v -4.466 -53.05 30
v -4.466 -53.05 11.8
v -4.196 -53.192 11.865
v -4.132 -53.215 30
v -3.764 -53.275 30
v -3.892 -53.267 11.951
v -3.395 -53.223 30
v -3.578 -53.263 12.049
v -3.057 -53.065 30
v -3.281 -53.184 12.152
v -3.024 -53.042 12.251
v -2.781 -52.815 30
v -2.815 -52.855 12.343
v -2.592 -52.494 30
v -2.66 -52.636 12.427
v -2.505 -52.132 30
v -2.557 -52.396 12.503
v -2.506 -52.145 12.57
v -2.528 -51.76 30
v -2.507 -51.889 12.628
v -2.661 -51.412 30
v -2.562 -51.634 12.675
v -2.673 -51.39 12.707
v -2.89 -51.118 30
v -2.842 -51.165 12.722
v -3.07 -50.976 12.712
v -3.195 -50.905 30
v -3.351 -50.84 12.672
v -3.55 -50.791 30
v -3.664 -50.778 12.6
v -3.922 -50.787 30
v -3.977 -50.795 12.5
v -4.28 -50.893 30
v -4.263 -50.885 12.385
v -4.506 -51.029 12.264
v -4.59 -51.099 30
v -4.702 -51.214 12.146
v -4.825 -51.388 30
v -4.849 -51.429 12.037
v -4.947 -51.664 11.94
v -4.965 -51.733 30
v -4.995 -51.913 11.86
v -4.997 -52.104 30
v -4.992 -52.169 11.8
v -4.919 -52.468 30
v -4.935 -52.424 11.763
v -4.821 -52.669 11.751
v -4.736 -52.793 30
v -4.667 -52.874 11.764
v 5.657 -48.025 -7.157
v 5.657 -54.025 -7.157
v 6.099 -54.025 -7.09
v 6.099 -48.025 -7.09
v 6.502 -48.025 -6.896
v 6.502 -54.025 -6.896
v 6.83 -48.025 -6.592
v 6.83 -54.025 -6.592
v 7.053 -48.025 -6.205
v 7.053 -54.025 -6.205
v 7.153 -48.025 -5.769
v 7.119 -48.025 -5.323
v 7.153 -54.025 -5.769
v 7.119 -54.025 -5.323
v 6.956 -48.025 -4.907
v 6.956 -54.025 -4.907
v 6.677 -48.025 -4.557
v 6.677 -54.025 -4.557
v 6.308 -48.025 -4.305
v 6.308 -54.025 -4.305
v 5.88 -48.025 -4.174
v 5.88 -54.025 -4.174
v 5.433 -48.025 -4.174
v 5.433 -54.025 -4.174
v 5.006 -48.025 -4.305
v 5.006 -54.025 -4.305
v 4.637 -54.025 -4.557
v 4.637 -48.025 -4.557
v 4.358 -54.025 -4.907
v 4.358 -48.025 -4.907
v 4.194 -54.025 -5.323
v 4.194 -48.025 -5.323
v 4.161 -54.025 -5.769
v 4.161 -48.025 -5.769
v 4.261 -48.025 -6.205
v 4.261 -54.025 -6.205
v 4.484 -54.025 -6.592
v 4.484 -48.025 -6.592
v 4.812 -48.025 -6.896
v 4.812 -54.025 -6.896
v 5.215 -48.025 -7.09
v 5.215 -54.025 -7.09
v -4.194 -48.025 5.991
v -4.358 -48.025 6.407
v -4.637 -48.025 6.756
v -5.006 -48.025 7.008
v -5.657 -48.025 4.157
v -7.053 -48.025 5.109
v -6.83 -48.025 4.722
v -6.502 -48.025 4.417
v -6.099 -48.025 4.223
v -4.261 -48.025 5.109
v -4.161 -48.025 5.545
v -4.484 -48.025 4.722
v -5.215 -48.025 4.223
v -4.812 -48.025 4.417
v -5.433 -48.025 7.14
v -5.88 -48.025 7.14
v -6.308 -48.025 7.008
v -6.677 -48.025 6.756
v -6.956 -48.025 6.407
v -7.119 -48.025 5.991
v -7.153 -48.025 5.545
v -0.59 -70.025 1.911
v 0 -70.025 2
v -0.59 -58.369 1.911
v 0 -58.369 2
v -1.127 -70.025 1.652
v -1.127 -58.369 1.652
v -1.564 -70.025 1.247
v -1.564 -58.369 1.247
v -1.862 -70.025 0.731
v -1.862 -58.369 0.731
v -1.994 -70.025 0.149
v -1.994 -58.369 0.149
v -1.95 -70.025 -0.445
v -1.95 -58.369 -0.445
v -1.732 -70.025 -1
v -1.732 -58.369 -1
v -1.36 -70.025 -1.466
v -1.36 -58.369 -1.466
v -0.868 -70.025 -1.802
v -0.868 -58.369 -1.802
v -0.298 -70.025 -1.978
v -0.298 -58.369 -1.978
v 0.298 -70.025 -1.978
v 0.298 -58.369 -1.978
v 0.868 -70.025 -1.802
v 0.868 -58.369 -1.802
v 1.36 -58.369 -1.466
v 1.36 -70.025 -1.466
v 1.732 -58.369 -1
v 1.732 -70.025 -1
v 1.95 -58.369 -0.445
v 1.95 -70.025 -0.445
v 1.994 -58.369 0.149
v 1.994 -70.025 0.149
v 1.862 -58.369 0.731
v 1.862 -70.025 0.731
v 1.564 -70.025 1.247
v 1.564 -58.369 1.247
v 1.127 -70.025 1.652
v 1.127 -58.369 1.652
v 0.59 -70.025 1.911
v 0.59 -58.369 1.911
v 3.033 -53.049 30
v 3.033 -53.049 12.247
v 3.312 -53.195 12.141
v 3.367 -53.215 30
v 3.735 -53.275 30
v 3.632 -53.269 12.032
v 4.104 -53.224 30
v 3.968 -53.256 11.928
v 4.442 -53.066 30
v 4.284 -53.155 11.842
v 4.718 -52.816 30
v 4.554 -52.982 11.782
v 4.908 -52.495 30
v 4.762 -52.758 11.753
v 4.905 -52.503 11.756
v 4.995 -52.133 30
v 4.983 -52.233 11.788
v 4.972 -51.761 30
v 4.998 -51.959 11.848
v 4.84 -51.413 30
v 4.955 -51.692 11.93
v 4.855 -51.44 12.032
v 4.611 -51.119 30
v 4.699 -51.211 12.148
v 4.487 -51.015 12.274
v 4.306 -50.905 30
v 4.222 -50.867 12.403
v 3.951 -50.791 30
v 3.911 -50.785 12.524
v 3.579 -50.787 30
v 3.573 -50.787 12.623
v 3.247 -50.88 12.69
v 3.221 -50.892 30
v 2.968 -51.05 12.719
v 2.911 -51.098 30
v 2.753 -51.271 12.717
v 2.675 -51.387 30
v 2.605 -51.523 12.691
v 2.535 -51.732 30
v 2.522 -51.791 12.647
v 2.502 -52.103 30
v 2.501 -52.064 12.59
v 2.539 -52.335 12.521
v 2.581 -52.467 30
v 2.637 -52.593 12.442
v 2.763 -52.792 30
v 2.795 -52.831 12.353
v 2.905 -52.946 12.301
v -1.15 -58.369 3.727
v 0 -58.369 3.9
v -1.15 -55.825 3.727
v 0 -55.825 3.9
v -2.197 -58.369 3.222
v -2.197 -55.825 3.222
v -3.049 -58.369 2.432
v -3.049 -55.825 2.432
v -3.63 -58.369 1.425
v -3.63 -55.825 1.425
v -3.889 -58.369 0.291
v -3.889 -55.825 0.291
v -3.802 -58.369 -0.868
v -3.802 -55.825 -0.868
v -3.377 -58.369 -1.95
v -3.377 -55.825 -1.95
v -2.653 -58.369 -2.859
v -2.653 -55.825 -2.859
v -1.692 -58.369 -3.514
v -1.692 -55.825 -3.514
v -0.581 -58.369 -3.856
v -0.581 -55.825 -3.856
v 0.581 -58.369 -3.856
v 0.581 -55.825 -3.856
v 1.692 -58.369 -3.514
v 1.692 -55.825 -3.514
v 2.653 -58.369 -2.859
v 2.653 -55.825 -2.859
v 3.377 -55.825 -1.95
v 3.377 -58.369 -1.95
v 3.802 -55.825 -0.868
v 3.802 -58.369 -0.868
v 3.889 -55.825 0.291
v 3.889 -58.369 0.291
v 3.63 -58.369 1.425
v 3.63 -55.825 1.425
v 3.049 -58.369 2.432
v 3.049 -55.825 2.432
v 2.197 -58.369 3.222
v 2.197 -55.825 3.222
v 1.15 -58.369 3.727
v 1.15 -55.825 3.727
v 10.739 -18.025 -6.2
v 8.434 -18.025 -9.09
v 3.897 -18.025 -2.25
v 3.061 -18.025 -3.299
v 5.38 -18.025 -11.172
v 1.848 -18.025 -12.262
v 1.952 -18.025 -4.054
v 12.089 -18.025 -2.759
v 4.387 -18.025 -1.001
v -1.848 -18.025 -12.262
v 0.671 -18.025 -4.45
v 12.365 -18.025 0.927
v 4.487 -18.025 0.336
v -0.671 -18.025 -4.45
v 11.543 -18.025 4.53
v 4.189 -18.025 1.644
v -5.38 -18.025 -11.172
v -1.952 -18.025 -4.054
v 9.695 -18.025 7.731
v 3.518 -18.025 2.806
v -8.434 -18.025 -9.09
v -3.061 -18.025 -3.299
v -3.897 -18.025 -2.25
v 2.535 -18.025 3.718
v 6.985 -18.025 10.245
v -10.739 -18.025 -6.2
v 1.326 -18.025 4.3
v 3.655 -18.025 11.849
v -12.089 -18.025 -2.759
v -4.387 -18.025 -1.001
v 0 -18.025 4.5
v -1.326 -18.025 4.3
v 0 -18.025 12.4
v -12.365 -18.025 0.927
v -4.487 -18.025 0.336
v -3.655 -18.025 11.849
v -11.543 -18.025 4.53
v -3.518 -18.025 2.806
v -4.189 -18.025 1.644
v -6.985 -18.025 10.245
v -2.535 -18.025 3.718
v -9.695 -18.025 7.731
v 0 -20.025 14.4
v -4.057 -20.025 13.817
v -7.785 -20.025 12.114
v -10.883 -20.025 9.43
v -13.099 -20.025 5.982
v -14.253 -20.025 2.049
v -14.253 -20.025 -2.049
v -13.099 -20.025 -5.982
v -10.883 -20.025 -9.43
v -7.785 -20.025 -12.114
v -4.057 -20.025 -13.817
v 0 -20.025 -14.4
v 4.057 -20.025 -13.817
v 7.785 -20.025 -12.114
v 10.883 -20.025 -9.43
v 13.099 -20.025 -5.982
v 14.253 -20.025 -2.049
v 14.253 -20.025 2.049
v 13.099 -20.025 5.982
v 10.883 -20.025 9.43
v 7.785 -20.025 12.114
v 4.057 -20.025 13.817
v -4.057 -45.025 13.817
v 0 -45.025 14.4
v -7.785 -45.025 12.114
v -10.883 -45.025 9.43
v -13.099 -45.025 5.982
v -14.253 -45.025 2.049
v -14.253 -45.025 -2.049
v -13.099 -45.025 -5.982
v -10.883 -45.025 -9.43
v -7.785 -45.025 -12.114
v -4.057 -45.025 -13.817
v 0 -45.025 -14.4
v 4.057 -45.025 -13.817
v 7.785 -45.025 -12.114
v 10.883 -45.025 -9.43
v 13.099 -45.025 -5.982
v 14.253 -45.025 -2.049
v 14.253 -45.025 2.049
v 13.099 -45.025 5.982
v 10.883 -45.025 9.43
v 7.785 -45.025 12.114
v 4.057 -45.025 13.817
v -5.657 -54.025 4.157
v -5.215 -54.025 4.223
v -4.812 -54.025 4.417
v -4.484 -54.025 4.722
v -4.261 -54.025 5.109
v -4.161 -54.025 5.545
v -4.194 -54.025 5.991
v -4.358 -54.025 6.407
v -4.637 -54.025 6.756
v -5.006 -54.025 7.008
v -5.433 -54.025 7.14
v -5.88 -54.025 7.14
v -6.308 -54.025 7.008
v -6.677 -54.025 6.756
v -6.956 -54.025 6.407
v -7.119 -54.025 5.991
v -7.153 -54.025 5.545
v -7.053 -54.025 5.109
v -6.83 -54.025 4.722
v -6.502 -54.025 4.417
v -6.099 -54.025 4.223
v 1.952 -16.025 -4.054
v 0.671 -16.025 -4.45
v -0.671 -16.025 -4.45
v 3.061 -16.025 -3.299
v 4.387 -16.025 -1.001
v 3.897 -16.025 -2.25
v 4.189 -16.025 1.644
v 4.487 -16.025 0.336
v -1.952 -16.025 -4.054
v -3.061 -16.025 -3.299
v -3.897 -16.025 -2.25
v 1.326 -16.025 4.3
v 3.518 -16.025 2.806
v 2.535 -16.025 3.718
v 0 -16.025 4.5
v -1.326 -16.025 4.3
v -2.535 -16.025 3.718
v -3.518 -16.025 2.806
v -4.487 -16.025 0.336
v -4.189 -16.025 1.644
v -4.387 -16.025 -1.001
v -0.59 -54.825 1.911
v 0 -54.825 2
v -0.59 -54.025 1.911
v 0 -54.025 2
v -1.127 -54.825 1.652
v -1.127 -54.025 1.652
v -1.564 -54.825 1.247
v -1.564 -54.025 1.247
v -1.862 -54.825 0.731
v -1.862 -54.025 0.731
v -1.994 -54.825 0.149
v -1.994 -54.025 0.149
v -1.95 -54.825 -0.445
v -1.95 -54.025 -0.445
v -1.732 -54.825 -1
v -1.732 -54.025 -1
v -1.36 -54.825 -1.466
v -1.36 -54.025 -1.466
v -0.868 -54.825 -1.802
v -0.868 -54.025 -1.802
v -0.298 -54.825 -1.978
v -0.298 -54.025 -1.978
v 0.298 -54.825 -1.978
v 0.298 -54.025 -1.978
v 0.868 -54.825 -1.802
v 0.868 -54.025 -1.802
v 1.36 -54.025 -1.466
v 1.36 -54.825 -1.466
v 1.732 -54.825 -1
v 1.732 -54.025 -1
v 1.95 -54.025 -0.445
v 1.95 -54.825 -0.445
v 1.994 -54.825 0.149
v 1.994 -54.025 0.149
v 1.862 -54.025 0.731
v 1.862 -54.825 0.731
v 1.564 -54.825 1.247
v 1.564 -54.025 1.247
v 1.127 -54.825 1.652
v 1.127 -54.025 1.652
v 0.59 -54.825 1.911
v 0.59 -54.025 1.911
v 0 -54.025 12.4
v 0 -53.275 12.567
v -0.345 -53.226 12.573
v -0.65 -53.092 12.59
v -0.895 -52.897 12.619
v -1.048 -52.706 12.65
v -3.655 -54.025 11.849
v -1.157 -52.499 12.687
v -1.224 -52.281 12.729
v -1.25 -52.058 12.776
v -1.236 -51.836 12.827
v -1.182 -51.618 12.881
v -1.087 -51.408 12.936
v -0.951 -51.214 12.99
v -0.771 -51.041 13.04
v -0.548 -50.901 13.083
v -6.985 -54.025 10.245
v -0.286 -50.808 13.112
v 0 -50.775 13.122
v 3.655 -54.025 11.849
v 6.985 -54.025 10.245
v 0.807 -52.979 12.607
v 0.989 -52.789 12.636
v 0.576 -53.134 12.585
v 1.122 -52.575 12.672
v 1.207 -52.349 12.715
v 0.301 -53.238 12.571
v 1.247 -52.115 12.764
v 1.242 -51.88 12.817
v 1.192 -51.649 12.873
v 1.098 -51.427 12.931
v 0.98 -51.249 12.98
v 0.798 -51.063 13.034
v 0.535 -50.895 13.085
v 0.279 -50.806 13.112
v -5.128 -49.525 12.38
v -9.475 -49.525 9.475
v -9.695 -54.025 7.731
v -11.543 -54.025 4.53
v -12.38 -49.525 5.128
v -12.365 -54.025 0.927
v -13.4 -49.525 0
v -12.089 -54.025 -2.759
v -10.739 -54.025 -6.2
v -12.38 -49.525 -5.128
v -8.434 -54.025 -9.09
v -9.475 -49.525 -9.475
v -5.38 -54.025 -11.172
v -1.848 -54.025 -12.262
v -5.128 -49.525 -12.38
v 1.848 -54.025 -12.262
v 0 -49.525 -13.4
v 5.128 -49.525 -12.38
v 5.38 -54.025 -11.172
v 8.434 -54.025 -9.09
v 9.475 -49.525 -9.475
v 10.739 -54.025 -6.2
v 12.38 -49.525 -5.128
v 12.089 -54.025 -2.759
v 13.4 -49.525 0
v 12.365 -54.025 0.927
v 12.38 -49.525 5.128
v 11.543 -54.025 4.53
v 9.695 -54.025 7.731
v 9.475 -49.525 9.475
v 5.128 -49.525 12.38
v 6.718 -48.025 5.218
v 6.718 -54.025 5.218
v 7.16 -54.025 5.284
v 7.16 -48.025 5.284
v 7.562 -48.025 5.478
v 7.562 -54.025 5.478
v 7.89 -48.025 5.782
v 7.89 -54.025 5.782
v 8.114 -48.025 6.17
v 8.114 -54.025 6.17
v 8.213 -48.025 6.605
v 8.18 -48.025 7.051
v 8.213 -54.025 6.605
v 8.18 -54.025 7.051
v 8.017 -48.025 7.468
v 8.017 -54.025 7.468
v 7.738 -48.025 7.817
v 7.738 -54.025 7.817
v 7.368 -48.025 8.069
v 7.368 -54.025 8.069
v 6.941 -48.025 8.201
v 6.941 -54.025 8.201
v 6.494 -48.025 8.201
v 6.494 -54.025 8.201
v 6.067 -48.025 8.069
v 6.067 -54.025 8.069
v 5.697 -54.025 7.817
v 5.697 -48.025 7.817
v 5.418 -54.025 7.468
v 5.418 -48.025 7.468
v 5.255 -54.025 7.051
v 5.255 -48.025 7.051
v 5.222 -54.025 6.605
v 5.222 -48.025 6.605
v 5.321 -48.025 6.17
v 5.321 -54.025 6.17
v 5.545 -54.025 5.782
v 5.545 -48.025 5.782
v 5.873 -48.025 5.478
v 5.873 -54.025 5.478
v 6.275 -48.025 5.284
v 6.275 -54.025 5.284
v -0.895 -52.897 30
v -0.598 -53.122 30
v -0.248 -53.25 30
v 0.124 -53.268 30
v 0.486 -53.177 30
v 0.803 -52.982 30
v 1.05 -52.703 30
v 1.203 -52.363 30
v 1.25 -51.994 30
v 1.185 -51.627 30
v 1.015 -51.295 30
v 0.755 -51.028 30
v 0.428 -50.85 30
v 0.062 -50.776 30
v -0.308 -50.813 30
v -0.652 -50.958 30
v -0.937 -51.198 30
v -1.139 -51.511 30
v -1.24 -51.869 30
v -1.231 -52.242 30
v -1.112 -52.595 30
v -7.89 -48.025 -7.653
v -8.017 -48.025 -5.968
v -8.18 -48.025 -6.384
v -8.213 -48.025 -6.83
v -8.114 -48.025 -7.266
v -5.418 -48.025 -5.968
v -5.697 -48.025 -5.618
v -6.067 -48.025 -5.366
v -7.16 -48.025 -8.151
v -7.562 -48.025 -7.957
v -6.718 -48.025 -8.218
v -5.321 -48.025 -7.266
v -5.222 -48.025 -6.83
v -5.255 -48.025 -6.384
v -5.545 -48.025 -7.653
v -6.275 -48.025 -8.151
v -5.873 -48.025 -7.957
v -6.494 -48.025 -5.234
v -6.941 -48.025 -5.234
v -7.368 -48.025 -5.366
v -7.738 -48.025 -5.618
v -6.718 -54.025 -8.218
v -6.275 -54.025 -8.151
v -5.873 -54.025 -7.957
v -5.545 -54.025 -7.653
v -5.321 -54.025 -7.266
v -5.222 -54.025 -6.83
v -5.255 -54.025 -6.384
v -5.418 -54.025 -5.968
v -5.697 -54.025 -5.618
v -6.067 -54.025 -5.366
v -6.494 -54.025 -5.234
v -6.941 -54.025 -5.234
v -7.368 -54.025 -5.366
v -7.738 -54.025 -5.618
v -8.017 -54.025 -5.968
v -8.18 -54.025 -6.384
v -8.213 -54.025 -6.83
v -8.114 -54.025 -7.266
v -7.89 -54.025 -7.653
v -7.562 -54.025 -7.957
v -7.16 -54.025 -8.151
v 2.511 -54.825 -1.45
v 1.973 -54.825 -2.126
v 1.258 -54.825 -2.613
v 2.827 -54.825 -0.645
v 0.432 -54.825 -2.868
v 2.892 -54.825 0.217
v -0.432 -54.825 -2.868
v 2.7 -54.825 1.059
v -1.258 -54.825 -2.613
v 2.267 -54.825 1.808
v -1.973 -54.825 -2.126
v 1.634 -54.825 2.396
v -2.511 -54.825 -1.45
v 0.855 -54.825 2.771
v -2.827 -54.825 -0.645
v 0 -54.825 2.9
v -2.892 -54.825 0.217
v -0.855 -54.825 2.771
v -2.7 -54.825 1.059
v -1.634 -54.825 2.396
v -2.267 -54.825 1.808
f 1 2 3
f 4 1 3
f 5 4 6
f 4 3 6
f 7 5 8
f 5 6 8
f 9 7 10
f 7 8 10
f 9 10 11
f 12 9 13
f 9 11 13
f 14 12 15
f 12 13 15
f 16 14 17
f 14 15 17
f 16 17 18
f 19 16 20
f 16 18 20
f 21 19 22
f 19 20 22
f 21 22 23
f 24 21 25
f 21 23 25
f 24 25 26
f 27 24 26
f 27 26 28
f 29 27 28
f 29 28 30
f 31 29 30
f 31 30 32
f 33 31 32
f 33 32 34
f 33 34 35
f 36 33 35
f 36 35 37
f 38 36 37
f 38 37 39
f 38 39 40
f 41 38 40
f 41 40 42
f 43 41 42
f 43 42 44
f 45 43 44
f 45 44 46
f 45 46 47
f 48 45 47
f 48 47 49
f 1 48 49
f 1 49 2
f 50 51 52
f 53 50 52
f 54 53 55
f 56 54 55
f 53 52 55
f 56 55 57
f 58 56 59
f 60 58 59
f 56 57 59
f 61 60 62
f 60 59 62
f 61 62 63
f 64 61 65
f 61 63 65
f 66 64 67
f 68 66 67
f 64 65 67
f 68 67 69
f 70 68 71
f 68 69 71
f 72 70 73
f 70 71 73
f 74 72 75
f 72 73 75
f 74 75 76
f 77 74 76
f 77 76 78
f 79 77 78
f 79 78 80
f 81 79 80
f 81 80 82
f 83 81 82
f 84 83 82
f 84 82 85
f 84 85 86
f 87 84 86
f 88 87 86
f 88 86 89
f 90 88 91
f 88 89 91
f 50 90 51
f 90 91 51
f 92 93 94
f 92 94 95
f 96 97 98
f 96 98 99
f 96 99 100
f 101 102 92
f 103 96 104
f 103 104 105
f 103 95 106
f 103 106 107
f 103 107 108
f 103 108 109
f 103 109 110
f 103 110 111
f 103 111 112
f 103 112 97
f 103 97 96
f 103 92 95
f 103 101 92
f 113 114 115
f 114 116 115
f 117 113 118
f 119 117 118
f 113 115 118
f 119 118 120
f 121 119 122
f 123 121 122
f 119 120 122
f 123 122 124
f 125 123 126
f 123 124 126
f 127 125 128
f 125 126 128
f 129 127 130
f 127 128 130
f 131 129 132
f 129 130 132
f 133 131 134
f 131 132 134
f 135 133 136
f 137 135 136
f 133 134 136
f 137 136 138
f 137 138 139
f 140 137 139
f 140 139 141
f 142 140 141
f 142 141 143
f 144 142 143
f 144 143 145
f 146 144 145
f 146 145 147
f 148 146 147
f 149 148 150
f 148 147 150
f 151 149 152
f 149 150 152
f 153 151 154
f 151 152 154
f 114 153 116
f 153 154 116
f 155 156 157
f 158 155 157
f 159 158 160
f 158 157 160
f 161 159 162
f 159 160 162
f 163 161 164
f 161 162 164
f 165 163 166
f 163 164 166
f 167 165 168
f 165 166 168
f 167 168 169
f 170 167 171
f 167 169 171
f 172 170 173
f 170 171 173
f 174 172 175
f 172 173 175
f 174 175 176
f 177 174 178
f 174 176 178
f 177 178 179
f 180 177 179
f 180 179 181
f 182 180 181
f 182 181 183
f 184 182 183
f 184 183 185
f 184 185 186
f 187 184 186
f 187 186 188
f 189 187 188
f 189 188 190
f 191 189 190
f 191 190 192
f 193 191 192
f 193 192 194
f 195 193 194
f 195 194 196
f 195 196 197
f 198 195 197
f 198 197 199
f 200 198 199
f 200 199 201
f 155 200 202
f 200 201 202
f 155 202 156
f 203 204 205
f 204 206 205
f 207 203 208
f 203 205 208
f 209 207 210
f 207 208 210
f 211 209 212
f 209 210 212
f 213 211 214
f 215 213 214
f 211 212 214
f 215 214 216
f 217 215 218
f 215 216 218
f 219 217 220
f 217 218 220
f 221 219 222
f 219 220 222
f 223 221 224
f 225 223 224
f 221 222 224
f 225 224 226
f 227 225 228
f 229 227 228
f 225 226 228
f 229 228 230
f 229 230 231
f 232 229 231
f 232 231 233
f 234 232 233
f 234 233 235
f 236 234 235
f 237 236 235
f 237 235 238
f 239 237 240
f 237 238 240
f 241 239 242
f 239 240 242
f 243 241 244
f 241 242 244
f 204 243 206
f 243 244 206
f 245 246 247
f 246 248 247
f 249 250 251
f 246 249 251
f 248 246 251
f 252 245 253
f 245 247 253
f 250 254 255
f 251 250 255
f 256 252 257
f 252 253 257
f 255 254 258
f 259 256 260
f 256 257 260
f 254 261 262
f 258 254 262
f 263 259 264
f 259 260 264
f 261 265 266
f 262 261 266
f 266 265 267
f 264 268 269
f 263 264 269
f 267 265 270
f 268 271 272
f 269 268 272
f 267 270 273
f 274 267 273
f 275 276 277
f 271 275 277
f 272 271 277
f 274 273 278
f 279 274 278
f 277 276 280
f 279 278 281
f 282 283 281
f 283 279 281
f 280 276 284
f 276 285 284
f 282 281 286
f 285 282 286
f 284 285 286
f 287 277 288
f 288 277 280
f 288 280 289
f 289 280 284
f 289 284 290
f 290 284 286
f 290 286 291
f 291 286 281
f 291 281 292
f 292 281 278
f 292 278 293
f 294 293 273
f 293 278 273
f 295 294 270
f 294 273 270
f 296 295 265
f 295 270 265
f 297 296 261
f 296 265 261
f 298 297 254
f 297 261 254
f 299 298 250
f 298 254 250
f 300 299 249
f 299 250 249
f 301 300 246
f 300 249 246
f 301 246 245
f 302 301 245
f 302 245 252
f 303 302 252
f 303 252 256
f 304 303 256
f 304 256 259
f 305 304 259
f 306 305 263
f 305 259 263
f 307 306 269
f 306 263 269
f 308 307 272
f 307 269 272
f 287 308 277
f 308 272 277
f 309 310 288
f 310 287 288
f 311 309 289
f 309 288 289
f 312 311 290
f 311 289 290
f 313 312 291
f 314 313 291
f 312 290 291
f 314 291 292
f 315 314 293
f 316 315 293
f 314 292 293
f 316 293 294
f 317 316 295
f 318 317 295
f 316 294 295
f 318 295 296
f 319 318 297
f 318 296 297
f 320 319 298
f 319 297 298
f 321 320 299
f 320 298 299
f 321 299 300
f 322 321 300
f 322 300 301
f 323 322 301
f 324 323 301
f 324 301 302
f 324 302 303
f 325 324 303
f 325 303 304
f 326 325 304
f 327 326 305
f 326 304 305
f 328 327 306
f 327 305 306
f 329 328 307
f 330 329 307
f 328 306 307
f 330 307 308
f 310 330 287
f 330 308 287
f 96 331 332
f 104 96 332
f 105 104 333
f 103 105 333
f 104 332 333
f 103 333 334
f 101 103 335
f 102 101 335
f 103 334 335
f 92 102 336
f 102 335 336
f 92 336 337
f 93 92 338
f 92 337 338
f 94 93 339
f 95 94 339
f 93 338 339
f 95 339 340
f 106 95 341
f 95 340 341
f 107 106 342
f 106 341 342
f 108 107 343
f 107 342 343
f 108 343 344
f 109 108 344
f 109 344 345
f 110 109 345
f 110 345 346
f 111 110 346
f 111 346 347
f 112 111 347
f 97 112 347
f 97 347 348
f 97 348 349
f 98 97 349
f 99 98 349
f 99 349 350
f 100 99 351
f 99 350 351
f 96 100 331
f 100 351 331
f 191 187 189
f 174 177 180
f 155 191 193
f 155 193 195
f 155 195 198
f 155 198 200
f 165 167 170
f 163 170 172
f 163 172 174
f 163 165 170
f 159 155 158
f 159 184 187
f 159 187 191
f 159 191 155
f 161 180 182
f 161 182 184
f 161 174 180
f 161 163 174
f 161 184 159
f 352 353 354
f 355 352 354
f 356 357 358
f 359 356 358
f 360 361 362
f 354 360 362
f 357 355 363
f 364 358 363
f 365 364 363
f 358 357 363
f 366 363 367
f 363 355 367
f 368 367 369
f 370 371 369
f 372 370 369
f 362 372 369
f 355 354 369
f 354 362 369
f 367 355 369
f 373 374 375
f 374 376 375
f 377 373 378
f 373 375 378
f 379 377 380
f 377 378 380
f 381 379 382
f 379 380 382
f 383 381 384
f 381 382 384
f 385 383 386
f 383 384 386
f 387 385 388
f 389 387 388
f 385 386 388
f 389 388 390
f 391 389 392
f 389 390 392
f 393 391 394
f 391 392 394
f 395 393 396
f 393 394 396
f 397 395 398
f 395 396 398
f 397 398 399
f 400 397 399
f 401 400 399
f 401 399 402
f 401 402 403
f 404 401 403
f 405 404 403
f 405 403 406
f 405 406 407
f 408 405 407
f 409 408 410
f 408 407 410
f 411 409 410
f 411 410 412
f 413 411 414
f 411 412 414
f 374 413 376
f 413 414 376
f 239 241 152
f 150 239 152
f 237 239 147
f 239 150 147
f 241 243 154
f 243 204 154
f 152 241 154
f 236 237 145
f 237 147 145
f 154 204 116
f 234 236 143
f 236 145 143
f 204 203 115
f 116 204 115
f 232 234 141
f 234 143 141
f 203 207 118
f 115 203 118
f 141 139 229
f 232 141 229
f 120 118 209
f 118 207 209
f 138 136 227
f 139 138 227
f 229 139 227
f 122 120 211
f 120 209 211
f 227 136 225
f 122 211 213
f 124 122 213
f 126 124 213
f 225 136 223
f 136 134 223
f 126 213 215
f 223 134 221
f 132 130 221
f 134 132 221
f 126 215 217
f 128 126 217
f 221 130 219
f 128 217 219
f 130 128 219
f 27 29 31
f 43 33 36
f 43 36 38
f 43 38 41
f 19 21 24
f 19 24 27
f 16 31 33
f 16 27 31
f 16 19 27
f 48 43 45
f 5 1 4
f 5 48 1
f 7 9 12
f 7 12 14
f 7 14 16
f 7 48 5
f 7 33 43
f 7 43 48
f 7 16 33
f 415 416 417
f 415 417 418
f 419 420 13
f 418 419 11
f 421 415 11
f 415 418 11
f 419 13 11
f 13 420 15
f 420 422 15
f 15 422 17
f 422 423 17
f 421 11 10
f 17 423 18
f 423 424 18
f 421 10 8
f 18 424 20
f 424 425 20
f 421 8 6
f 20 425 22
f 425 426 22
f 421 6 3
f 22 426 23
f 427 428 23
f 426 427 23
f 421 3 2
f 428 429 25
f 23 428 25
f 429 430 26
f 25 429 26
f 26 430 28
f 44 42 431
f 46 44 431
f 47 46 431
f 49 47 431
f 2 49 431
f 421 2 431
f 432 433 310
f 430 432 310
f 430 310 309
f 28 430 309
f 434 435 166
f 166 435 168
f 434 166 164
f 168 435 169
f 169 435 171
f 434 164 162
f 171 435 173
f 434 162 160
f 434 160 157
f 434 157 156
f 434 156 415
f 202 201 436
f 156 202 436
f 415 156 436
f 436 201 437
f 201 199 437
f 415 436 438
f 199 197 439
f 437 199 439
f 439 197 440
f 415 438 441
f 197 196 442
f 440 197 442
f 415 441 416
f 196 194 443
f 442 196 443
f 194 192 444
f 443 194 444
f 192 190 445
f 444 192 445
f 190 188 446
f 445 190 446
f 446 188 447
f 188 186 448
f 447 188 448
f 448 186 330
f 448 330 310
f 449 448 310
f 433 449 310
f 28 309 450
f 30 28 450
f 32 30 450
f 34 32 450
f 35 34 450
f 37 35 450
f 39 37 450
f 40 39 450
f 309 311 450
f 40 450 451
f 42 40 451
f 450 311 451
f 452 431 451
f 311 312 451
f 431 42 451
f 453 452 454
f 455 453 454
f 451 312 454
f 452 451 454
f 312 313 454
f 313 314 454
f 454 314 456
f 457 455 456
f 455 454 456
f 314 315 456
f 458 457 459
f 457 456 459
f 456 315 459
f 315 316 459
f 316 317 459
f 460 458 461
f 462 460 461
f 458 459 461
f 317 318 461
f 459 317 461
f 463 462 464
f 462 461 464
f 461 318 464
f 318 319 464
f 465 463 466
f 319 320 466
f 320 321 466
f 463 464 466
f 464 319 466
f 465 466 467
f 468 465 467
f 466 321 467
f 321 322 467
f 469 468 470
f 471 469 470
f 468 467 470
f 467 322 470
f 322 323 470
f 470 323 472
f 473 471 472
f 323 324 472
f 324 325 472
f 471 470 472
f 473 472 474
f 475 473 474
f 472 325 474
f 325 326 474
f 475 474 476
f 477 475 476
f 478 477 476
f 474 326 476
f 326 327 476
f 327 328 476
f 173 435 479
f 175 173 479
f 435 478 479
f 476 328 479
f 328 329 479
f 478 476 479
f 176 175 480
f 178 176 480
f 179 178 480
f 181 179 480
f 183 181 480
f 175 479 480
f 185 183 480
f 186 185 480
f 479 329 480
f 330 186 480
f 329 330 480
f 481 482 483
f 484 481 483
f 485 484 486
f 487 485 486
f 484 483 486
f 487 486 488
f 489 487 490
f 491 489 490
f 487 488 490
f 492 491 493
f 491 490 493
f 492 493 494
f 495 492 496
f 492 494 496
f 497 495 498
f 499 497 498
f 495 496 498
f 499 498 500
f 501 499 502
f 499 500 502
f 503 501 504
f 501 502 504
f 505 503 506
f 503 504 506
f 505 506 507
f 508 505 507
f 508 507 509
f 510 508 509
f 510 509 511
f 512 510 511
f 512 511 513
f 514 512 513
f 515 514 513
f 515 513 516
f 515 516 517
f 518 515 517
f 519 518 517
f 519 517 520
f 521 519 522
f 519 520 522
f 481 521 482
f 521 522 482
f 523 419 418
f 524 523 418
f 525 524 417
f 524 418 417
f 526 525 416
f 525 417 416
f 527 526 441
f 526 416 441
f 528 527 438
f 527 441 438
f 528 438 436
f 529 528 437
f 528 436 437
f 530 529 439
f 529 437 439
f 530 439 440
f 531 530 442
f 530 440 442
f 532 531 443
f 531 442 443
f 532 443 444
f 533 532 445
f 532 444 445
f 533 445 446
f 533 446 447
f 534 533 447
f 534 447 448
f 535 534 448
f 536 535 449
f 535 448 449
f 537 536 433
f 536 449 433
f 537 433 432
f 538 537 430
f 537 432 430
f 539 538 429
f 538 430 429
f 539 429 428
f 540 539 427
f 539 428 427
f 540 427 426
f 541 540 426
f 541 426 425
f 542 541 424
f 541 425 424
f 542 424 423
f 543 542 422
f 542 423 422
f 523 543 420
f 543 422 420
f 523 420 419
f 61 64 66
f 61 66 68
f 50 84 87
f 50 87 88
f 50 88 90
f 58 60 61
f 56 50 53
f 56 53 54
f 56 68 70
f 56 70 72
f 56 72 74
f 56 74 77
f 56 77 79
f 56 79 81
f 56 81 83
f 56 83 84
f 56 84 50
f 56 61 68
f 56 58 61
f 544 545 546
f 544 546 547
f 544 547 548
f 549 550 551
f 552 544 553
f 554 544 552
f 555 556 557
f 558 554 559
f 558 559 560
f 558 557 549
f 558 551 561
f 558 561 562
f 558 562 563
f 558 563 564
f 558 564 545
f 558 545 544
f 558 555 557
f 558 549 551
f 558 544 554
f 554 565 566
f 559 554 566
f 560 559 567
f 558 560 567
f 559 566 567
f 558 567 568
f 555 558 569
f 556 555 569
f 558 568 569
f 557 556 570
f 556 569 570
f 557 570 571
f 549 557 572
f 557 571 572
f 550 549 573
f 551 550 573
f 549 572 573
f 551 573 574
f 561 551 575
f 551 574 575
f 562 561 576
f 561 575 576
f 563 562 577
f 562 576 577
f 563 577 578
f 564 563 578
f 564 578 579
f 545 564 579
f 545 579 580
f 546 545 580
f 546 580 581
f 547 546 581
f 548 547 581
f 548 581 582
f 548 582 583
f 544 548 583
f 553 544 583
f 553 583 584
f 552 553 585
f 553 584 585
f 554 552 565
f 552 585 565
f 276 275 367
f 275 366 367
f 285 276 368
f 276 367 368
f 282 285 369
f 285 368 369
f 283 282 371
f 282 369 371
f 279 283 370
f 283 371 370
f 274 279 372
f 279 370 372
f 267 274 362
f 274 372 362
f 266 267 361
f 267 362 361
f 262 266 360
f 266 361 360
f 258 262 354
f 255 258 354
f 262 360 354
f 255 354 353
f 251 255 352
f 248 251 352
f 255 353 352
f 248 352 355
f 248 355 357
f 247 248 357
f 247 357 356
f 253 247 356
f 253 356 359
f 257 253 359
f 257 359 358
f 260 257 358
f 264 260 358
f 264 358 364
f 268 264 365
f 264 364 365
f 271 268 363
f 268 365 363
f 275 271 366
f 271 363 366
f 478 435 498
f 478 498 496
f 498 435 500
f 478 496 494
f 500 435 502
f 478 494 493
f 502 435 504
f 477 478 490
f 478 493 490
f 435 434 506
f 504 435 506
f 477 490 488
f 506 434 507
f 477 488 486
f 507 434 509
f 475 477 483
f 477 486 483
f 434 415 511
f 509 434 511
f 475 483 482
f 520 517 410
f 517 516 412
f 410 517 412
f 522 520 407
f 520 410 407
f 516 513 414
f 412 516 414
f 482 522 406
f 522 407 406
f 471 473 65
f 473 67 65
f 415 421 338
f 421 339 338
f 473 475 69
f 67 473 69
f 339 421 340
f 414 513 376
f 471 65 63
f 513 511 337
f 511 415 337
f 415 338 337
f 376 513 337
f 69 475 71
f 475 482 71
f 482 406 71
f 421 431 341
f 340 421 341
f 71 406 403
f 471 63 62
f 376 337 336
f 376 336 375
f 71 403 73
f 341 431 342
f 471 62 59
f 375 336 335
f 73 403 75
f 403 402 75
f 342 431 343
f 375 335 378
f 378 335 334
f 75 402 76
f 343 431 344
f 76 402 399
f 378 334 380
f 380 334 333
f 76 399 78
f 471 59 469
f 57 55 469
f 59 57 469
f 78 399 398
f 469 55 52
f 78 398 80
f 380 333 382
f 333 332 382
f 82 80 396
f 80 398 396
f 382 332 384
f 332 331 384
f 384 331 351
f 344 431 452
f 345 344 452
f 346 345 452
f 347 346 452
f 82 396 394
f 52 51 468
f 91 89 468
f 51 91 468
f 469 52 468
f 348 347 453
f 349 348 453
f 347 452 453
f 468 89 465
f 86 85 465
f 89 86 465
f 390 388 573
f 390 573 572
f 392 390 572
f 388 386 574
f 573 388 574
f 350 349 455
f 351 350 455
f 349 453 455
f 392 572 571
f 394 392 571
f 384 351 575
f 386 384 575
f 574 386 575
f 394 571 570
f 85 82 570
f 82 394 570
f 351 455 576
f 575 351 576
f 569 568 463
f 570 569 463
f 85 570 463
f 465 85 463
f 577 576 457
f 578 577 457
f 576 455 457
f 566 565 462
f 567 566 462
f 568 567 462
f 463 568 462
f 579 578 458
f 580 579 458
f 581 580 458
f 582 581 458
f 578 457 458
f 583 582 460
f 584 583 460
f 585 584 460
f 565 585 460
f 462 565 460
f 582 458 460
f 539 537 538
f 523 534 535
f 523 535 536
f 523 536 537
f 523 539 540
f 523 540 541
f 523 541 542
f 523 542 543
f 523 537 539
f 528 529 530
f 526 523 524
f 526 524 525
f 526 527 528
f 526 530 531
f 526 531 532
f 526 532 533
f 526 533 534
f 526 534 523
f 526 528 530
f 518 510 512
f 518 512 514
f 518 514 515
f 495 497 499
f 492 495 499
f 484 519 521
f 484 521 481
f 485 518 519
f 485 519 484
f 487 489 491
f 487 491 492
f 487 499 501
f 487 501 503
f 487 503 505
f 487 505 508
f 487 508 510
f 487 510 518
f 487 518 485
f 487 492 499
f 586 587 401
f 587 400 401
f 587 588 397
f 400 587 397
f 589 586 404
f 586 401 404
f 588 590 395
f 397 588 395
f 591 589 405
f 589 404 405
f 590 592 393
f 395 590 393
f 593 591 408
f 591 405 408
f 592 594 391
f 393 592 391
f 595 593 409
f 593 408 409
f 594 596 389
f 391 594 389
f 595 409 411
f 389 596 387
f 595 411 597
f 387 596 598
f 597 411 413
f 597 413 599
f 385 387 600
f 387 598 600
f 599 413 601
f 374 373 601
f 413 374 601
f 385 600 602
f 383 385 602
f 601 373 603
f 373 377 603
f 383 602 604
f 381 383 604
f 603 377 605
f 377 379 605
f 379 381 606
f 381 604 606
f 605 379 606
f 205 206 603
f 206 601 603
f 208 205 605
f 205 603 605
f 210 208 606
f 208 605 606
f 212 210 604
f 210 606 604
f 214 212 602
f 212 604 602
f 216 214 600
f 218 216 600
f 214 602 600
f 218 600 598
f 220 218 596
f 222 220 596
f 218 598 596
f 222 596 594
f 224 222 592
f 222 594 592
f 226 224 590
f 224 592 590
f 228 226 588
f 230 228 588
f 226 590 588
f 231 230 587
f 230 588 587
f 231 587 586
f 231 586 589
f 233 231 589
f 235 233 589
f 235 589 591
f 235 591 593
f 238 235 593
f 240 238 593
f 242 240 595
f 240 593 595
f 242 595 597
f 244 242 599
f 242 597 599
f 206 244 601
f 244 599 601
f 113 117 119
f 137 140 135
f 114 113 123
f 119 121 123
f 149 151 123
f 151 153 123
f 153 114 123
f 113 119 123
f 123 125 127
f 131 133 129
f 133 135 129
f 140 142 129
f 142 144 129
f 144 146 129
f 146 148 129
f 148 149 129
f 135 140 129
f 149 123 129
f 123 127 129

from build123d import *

# Parameters (mm, degrees)
SKETCH2_R           = 1.5
CUT_EXTRUDE1_DEPTH  = 6
SKETCH3_R           = 1.25
BOSS_EXTRUDE1_DEPTH = 20


with BuildPart() as part:
    # Sketch1 → Revolve2 (revolve)
    with BuildSketch(Plane.XY, mode=Mode.PRIVATE) as revolve2_sk:
        Polygon((14.4, -45.024704817), (14.4, -20.024704817), (12.4, -18.024704817), (4.5, -18.024704817), (4.5, -16.024704817), (0, -16.024704817), (0, -70.024704817), (2, -70.024704817), (2, -58.36883633), (3.9, -58.36883633), (3.9, -55.824704817), (2.9, -54.824704817), (2, -54.824704817), (2, -54.024704817), (12.4, -54.024704817), align=None)
    revolve(revolve2_sk.sketch.rotate(Axis((0, 0, 0), (0, -1, 0)), 90), axis=Axis((0, 0, 0), (0, -1, 0)))

    # Sketch2 → Cut-Extrude1 (cut)
    with BuildSketch(Plane.XZ.offset(54.024704817)):
        with Locations(Location((6.717514421, 6.717514421, 0), (0, 0, 270))):
            Circle(SKETCH2_R)
        with Locations(Location((5.656854249, -5.656854249, 0), (0, 0, 270))):
            Circle(SKETCH2_R)
        with Locations(Location((-6.717514421, -6.717514421, 0), (0, 0, 270))):
            Circle(SKETCH2_R)
        with Locations(Location((-5.656854249, 5.656854249, 0), (0, 0, 270))):
            Circle(SKETCH2_R)
    extrude(amount=-CUT_EXTRUDE1_DEPTH, mode=Mode.SUBTRACT)

    # Sketch3 → Boss-Extrude1 (add)
    with BuildSketch(Plane.XY.offset(10)):
        with Locations(Location((0, -52.024704817, 0), (0, 0, 224.284221248))):
            Circle(SKETCH3_R)
        with Locations(Location((3.75, -52.024704817, 0), (0, 0, 235.024751842))):
            Circle(SKETCH3_R)
        with Locations(Location((-3.75, -52.024704817, 0), (0, 0, 235.074308892))):
            Circle(SKETCH3_R)
    extrude(amount=BOSS_EXTRUDE1_DEPTH)


solid = part.part
